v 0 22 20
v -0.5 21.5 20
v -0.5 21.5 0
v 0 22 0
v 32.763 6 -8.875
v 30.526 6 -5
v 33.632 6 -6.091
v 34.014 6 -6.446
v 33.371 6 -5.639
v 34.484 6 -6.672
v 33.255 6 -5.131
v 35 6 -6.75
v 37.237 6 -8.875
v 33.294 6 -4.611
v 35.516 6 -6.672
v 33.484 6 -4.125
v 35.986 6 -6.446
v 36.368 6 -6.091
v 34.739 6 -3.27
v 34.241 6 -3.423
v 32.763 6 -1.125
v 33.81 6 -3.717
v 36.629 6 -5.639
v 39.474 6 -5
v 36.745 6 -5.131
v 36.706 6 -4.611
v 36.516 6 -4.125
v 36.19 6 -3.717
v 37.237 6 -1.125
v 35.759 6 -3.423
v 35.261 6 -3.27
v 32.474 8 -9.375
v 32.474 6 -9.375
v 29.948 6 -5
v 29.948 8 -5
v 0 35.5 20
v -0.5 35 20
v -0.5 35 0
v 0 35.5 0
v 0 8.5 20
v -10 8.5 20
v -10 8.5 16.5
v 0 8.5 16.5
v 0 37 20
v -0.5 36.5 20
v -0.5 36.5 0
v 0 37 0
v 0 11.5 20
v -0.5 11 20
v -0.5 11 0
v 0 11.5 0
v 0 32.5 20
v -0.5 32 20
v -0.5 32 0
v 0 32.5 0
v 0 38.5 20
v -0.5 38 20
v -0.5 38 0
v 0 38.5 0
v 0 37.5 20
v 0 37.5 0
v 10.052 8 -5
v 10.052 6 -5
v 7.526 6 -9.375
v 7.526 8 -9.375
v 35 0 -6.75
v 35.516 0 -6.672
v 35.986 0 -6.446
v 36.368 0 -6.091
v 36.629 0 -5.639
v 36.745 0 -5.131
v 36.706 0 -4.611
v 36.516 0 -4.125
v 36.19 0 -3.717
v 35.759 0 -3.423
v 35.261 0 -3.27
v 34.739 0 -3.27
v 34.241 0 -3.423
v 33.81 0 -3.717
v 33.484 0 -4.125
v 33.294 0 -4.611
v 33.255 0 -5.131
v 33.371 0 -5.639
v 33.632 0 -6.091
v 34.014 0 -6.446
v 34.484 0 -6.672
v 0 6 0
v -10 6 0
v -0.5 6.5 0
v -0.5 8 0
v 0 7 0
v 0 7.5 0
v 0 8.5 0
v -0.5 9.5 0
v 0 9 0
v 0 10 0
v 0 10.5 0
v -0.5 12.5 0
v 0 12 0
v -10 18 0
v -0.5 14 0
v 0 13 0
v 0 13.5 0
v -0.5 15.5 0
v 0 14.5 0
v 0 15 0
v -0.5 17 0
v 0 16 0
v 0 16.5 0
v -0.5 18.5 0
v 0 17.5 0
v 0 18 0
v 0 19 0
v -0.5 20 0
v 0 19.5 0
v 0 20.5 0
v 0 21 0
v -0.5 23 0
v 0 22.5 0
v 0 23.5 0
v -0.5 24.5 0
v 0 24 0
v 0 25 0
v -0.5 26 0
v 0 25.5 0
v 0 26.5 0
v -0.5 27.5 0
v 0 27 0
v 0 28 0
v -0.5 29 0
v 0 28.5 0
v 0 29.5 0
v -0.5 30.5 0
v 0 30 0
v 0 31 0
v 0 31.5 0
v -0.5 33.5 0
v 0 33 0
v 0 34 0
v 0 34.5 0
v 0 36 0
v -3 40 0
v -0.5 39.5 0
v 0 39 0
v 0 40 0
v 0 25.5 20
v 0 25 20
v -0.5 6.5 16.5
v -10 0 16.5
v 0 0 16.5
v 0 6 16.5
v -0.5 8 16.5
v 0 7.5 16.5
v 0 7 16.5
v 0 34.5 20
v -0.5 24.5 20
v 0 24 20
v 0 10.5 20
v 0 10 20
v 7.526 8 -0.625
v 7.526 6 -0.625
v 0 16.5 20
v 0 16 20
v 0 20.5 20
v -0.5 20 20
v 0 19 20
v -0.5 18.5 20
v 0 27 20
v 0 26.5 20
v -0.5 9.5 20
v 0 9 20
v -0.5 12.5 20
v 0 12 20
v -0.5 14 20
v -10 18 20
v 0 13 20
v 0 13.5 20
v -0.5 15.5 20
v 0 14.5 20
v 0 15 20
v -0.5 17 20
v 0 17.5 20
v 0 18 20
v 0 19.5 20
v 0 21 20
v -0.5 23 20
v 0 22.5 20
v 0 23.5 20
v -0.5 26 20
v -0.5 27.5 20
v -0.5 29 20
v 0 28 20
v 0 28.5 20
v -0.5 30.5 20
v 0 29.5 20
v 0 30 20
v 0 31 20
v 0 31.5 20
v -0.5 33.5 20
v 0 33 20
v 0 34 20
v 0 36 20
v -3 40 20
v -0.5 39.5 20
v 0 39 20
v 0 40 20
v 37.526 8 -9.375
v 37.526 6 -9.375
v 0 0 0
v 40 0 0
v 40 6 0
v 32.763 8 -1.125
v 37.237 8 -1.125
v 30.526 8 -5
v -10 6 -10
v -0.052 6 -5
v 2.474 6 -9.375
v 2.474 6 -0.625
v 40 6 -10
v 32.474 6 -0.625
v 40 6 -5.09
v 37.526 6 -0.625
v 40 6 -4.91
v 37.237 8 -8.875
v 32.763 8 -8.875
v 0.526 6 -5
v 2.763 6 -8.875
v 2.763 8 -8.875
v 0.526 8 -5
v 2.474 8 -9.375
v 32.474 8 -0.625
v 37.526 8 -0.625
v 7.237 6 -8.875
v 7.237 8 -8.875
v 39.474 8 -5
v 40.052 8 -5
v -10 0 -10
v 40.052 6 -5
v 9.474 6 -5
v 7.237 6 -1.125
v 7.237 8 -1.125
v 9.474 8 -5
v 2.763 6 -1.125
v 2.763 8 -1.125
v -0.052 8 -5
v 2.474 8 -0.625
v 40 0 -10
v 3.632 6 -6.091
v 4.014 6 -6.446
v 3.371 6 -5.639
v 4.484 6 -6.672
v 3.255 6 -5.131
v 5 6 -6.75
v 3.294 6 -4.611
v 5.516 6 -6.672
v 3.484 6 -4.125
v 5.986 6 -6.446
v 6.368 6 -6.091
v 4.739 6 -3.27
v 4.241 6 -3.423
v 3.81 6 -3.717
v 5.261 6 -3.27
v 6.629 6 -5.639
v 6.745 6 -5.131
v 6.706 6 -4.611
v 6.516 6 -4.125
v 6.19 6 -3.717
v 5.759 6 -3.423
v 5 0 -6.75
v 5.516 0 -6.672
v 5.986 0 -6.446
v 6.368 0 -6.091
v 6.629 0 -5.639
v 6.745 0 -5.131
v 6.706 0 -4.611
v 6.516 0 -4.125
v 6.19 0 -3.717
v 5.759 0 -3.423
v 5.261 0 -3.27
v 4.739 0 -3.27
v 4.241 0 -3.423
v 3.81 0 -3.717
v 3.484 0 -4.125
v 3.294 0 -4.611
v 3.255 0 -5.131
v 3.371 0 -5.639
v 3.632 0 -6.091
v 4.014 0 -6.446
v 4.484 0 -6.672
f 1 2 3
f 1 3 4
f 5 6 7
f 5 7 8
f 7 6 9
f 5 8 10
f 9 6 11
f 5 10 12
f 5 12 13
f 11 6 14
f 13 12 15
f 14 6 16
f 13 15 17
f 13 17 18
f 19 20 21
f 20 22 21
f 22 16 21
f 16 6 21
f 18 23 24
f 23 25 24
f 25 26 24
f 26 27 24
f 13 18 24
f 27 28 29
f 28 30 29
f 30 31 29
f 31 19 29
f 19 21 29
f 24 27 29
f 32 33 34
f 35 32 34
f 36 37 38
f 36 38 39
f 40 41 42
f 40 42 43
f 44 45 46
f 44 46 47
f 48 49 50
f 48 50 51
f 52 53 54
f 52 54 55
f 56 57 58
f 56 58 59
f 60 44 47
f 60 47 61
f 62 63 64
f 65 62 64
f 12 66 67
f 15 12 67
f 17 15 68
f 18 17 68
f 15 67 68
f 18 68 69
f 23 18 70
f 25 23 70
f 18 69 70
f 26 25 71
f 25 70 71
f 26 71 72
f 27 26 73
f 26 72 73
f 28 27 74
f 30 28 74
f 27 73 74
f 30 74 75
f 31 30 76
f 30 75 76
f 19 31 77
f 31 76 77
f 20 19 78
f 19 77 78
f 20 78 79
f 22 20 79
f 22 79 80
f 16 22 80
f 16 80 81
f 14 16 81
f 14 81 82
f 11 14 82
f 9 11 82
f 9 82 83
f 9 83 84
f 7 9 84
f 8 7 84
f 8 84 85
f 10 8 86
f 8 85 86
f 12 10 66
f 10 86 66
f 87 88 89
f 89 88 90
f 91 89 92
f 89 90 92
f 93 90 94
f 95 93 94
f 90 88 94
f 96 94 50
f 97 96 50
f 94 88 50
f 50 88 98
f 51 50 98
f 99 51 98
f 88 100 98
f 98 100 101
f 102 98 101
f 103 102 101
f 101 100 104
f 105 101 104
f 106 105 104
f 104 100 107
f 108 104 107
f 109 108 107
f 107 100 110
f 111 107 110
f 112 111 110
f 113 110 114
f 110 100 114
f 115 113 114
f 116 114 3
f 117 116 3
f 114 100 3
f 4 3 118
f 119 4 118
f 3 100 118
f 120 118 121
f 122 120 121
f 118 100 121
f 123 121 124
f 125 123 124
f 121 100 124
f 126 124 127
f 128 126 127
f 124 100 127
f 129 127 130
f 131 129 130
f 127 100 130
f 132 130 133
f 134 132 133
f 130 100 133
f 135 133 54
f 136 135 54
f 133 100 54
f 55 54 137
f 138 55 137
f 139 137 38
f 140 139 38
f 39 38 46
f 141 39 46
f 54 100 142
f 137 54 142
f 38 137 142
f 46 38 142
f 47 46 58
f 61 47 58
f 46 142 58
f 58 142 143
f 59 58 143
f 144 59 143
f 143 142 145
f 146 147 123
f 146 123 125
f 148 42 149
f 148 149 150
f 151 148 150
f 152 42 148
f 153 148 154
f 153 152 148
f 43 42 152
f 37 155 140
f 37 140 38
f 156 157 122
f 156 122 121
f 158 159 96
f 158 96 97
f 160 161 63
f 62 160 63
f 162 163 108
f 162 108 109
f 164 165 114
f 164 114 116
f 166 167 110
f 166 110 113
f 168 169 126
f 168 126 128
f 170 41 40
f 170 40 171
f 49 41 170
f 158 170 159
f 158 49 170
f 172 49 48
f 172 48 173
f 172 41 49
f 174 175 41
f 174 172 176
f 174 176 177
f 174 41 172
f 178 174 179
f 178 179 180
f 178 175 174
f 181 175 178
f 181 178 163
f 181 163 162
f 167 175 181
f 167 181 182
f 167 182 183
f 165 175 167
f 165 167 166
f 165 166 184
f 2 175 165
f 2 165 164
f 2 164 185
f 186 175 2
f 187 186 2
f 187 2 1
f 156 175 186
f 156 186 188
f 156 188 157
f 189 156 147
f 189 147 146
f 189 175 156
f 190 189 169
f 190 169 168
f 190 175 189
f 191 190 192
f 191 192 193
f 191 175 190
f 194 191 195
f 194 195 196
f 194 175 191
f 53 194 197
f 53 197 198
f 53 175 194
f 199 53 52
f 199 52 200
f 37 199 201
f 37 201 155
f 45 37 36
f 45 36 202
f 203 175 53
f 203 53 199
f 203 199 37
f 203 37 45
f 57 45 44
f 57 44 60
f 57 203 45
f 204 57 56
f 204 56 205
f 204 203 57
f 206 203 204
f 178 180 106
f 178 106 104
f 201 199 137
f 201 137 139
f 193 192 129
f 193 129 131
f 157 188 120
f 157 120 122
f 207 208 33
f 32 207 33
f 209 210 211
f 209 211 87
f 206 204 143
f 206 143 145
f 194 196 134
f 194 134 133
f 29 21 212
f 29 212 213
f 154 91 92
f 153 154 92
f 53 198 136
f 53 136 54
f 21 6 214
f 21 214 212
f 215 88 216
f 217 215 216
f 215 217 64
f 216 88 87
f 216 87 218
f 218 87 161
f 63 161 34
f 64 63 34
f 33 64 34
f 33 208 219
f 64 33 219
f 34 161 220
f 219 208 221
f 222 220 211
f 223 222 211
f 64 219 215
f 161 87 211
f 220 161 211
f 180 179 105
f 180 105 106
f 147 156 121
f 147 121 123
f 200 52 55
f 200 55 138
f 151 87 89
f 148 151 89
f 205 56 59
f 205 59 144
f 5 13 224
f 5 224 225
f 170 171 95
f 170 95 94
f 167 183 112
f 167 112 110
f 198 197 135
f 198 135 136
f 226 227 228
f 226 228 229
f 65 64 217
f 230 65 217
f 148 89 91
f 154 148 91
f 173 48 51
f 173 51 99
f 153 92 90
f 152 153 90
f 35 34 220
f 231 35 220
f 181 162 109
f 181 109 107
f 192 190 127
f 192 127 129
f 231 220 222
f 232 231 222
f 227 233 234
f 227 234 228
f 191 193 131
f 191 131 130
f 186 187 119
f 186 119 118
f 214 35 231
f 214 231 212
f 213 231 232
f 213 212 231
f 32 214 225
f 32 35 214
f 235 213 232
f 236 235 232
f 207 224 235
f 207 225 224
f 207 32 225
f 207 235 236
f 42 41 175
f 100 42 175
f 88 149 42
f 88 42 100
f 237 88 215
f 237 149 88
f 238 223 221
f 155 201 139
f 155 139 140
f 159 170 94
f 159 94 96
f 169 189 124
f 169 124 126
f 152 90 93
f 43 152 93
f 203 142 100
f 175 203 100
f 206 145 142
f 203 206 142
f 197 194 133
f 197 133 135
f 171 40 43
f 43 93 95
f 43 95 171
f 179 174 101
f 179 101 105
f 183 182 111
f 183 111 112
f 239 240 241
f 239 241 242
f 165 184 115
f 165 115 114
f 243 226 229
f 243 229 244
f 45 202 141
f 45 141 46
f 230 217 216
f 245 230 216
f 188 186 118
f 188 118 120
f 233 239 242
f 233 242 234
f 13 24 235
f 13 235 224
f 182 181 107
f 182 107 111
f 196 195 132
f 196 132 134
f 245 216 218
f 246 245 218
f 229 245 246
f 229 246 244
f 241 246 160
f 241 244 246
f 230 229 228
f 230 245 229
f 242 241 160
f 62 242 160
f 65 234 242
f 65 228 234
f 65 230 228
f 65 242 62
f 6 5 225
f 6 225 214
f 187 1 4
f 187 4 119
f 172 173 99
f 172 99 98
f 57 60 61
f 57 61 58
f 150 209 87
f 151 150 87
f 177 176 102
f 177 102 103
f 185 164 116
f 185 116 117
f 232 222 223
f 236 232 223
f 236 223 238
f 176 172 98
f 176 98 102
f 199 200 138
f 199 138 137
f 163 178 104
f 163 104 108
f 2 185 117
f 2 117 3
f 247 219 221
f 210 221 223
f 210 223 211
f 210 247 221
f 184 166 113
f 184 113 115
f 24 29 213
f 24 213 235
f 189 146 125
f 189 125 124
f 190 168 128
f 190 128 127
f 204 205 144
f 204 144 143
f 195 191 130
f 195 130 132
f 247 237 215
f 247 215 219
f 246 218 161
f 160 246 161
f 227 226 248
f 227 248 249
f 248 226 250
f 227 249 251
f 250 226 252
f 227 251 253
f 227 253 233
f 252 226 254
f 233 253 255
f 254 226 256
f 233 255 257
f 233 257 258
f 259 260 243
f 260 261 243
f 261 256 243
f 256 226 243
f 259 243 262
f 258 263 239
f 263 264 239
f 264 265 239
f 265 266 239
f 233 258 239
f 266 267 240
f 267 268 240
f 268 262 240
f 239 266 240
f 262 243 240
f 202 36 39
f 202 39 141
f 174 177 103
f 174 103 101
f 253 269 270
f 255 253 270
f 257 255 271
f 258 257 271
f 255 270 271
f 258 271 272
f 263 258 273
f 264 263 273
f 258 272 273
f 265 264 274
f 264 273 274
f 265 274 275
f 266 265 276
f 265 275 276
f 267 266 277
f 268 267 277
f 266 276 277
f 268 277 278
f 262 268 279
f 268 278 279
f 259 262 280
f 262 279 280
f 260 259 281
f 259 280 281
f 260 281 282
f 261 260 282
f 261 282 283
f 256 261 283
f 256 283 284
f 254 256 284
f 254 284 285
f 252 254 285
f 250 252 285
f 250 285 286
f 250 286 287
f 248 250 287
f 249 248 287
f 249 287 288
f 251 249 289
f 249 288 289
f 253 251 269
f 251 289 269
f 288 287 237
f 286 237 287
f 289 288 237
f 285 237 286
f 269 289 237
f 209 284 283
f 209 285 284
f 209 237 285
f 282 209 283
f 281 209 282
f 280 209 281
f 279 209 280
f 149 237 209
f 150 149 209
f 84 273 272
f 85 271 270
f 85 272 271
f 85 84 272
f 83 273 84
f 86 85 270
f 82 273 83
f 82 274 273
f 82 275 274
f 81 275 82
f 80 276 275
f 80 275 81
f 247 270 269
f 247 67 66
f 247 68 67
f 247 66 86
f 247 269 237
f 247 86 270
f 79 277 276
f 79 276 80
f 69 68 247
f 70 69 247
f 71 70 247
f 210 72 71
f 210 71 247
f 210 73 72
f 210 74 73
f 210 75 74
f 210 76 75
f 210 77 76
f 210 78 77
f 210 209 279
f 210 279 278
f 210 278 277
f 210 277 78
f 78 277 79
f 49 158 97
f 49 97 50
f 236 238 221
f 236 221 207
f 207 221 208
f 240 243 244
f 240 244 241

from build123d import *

# Parameters (mm, degrees)
BOSS_EXTRUDE1_DEPTH = 20
SKETCH2_R           = 1.75
BOSS_EXTRUDE2_DEPTH = 6
CUT_EXTRUDE1_DEPTH  = 20
BOSS_EXTRUDE3_DEPTH = 2
SKETCH5_W           = 10
SKETCH5_H           = 8.5
CUT_EXTRUDE2_DEPTH  = 3.5


with BuildPart() as part:
    # Sketch1 → Boss-Extrude1 (new body)
    with BuildSketch(Plane.XY):
        Polygon((0, 0), (0, 40), (-3, 40), (-10, 18), (-10, 0), align=None)
    extrude(amount=BOSS_EXTRUDE1_DEPTH)

    # Sketch2 → Boss-Extrude2 (add)
    with BuildSketch(Plane.XZ):
        Polygon((-10, 0), (-10, -10), (40, -10), (40, 0), (0, 0), align=None)
        with Locations(Location((35, -5, 0), (0, 0, 270))):
            Circle(SKETCH2_R, mode=Mode.SUBTRACT)
        with Locations(Location((5, -5, 0), (0, 0, 270))):
            Circle(SKETCH2_R, mode=Mode.SUBTRACT)
    extrude(amount=-BOSS_EXTRUDE2_DEPTH)

    # Sketch3 → Cut-Extrude1 (cut)
    with BuildSketch(Plane.XY.offset(20)):
        Polygon((0, 6), (-0.5, 6.5), (0, 7), align=None)
        Polygon((0, 7.5), (-0.5, 8), (0, 8.5), align=None)
        Polygon((0, 9), (-0.5, 9.5), (0, 10), align=None)
        Polygon((0, 10.5), (-0.5, 11), (0, 11.5), align=None)
        Polygon((0, 12), (-0.5, 12.5), (0, 13), align=None)
        Polygon((0, 13.5), (-0.5, 14), (0, 14.5), align=None)
        Polygon((0, 15), (-0.5, 15.5), (0, 16), align=None)
        Polygon((0, 16.5), (-0.5, 17), (0, 17.5), align=None)
        Polygon((0, 18), (-0.5, 18.5), (0, 19), align=None)
        Polygon((0, 19.5), (-0.5, 20), (0, 20.5), align=None)
        Polygon((0, 21), (-0.5, 21.5), (0, 22), align=None)
        Polygon((0, 22.5), (-0.5, 23), (0, 23.5), align=None)
        Polygon((0, 24), (-0.5, 24.5), (0, 25), align=None)
        Polygon((0, 25.5), (-0.5, 26), (0, 26.5), align=None)
        Polygon((0, 27), (-0.5, 27.5), (0, 28), align=None)
        Polygon((0, 28.5), (-0.5, 29), (0, 29.5), align=None)
        Polygon((0, 30), (-0.5, 30.5), (0, 31), align=None)
        Polygon((0, 31.5), (-0.5, 32), (0, 32.5), align=None)
        Polygon((0, 33), (-0.5, 33.5), (0, 34), align=None)
        Polygon((0, 34.5), (-0.5, 35), (0, 35.5), align=None)
        Polygon((0, 36), (-0.5, 36.5), (0, 37), align=None)
        Polygon((0, 37.5), (-0.5, 38), (0, 38.5), align=None)
        Polygon((0, 39), (-0.5, 39.5), (0, 40), align=None)
        Polygon((0, 40.5), (-0.5, 41), (0, 41.5), align=None)
    extrude(amount=-CUT_EXTRUDE1_DEPTH, mode=Mode.SUBTRACT)

    # Sketch4 → Boss-Extrude3 (add)
    # profile 1 of 2: a face of its own
    with BuildSketch(Plane(origin=(0, 6, 0), x_dir=(1, 0, 0), z_dir=(0, 1, 0))):
        Polygon((10.051814855, 5), (7.525907428, 9.375), (2.474092572, 9.375), (-0.051814855, 5), (2.474092572, 0.625), (7.525907428, 0.625), align=None)
        Polygon((9.474464586, 5), (7.237232293, 8.875), (2.762767707, 8.875), (0.525535414, 5), (2.762767707, 1.125), (7.237232293, 1.125), align=None, mode=Mode.SUBTRACT)
    # profile 2 of 2: a face of its own
    with BuildSketch(Plane(origin=(0, 6, 0), x_dir=(1, 0, 0), z_dir=(0, 1, 0))):
        Polygon((40.051814855, 5), (37.525907428, 9.375), (32.474092572, 9.375), (29.948185145, 5), (32.474092572, 0.625), (37.525907428, 0.625), align=None)
        Polygon((39.474464586, 5), (37.237232293, 8.875), (32.762767707, 8.875), (30.525535414, 5), (32.762767707, 1.125), (37.237232293, 1.125), align=None, mode=Mode.SUBTRACT)
    extrude(amount=BOSS_EXTRUDE3_DEPTH)

    # Sketch5 → Cut-Extrude2 (cut)
    with BuildSketch(Plane.XY.offset(20)):
        with Locations((-5, 4.25)):
            Rectangle(SKETCH5_W, SKETCH5_H)
    extrude(amount=-CUT_EXTRUDE2_DEPTH, mode=Mode.SUBTRACT)


solid = part.part
